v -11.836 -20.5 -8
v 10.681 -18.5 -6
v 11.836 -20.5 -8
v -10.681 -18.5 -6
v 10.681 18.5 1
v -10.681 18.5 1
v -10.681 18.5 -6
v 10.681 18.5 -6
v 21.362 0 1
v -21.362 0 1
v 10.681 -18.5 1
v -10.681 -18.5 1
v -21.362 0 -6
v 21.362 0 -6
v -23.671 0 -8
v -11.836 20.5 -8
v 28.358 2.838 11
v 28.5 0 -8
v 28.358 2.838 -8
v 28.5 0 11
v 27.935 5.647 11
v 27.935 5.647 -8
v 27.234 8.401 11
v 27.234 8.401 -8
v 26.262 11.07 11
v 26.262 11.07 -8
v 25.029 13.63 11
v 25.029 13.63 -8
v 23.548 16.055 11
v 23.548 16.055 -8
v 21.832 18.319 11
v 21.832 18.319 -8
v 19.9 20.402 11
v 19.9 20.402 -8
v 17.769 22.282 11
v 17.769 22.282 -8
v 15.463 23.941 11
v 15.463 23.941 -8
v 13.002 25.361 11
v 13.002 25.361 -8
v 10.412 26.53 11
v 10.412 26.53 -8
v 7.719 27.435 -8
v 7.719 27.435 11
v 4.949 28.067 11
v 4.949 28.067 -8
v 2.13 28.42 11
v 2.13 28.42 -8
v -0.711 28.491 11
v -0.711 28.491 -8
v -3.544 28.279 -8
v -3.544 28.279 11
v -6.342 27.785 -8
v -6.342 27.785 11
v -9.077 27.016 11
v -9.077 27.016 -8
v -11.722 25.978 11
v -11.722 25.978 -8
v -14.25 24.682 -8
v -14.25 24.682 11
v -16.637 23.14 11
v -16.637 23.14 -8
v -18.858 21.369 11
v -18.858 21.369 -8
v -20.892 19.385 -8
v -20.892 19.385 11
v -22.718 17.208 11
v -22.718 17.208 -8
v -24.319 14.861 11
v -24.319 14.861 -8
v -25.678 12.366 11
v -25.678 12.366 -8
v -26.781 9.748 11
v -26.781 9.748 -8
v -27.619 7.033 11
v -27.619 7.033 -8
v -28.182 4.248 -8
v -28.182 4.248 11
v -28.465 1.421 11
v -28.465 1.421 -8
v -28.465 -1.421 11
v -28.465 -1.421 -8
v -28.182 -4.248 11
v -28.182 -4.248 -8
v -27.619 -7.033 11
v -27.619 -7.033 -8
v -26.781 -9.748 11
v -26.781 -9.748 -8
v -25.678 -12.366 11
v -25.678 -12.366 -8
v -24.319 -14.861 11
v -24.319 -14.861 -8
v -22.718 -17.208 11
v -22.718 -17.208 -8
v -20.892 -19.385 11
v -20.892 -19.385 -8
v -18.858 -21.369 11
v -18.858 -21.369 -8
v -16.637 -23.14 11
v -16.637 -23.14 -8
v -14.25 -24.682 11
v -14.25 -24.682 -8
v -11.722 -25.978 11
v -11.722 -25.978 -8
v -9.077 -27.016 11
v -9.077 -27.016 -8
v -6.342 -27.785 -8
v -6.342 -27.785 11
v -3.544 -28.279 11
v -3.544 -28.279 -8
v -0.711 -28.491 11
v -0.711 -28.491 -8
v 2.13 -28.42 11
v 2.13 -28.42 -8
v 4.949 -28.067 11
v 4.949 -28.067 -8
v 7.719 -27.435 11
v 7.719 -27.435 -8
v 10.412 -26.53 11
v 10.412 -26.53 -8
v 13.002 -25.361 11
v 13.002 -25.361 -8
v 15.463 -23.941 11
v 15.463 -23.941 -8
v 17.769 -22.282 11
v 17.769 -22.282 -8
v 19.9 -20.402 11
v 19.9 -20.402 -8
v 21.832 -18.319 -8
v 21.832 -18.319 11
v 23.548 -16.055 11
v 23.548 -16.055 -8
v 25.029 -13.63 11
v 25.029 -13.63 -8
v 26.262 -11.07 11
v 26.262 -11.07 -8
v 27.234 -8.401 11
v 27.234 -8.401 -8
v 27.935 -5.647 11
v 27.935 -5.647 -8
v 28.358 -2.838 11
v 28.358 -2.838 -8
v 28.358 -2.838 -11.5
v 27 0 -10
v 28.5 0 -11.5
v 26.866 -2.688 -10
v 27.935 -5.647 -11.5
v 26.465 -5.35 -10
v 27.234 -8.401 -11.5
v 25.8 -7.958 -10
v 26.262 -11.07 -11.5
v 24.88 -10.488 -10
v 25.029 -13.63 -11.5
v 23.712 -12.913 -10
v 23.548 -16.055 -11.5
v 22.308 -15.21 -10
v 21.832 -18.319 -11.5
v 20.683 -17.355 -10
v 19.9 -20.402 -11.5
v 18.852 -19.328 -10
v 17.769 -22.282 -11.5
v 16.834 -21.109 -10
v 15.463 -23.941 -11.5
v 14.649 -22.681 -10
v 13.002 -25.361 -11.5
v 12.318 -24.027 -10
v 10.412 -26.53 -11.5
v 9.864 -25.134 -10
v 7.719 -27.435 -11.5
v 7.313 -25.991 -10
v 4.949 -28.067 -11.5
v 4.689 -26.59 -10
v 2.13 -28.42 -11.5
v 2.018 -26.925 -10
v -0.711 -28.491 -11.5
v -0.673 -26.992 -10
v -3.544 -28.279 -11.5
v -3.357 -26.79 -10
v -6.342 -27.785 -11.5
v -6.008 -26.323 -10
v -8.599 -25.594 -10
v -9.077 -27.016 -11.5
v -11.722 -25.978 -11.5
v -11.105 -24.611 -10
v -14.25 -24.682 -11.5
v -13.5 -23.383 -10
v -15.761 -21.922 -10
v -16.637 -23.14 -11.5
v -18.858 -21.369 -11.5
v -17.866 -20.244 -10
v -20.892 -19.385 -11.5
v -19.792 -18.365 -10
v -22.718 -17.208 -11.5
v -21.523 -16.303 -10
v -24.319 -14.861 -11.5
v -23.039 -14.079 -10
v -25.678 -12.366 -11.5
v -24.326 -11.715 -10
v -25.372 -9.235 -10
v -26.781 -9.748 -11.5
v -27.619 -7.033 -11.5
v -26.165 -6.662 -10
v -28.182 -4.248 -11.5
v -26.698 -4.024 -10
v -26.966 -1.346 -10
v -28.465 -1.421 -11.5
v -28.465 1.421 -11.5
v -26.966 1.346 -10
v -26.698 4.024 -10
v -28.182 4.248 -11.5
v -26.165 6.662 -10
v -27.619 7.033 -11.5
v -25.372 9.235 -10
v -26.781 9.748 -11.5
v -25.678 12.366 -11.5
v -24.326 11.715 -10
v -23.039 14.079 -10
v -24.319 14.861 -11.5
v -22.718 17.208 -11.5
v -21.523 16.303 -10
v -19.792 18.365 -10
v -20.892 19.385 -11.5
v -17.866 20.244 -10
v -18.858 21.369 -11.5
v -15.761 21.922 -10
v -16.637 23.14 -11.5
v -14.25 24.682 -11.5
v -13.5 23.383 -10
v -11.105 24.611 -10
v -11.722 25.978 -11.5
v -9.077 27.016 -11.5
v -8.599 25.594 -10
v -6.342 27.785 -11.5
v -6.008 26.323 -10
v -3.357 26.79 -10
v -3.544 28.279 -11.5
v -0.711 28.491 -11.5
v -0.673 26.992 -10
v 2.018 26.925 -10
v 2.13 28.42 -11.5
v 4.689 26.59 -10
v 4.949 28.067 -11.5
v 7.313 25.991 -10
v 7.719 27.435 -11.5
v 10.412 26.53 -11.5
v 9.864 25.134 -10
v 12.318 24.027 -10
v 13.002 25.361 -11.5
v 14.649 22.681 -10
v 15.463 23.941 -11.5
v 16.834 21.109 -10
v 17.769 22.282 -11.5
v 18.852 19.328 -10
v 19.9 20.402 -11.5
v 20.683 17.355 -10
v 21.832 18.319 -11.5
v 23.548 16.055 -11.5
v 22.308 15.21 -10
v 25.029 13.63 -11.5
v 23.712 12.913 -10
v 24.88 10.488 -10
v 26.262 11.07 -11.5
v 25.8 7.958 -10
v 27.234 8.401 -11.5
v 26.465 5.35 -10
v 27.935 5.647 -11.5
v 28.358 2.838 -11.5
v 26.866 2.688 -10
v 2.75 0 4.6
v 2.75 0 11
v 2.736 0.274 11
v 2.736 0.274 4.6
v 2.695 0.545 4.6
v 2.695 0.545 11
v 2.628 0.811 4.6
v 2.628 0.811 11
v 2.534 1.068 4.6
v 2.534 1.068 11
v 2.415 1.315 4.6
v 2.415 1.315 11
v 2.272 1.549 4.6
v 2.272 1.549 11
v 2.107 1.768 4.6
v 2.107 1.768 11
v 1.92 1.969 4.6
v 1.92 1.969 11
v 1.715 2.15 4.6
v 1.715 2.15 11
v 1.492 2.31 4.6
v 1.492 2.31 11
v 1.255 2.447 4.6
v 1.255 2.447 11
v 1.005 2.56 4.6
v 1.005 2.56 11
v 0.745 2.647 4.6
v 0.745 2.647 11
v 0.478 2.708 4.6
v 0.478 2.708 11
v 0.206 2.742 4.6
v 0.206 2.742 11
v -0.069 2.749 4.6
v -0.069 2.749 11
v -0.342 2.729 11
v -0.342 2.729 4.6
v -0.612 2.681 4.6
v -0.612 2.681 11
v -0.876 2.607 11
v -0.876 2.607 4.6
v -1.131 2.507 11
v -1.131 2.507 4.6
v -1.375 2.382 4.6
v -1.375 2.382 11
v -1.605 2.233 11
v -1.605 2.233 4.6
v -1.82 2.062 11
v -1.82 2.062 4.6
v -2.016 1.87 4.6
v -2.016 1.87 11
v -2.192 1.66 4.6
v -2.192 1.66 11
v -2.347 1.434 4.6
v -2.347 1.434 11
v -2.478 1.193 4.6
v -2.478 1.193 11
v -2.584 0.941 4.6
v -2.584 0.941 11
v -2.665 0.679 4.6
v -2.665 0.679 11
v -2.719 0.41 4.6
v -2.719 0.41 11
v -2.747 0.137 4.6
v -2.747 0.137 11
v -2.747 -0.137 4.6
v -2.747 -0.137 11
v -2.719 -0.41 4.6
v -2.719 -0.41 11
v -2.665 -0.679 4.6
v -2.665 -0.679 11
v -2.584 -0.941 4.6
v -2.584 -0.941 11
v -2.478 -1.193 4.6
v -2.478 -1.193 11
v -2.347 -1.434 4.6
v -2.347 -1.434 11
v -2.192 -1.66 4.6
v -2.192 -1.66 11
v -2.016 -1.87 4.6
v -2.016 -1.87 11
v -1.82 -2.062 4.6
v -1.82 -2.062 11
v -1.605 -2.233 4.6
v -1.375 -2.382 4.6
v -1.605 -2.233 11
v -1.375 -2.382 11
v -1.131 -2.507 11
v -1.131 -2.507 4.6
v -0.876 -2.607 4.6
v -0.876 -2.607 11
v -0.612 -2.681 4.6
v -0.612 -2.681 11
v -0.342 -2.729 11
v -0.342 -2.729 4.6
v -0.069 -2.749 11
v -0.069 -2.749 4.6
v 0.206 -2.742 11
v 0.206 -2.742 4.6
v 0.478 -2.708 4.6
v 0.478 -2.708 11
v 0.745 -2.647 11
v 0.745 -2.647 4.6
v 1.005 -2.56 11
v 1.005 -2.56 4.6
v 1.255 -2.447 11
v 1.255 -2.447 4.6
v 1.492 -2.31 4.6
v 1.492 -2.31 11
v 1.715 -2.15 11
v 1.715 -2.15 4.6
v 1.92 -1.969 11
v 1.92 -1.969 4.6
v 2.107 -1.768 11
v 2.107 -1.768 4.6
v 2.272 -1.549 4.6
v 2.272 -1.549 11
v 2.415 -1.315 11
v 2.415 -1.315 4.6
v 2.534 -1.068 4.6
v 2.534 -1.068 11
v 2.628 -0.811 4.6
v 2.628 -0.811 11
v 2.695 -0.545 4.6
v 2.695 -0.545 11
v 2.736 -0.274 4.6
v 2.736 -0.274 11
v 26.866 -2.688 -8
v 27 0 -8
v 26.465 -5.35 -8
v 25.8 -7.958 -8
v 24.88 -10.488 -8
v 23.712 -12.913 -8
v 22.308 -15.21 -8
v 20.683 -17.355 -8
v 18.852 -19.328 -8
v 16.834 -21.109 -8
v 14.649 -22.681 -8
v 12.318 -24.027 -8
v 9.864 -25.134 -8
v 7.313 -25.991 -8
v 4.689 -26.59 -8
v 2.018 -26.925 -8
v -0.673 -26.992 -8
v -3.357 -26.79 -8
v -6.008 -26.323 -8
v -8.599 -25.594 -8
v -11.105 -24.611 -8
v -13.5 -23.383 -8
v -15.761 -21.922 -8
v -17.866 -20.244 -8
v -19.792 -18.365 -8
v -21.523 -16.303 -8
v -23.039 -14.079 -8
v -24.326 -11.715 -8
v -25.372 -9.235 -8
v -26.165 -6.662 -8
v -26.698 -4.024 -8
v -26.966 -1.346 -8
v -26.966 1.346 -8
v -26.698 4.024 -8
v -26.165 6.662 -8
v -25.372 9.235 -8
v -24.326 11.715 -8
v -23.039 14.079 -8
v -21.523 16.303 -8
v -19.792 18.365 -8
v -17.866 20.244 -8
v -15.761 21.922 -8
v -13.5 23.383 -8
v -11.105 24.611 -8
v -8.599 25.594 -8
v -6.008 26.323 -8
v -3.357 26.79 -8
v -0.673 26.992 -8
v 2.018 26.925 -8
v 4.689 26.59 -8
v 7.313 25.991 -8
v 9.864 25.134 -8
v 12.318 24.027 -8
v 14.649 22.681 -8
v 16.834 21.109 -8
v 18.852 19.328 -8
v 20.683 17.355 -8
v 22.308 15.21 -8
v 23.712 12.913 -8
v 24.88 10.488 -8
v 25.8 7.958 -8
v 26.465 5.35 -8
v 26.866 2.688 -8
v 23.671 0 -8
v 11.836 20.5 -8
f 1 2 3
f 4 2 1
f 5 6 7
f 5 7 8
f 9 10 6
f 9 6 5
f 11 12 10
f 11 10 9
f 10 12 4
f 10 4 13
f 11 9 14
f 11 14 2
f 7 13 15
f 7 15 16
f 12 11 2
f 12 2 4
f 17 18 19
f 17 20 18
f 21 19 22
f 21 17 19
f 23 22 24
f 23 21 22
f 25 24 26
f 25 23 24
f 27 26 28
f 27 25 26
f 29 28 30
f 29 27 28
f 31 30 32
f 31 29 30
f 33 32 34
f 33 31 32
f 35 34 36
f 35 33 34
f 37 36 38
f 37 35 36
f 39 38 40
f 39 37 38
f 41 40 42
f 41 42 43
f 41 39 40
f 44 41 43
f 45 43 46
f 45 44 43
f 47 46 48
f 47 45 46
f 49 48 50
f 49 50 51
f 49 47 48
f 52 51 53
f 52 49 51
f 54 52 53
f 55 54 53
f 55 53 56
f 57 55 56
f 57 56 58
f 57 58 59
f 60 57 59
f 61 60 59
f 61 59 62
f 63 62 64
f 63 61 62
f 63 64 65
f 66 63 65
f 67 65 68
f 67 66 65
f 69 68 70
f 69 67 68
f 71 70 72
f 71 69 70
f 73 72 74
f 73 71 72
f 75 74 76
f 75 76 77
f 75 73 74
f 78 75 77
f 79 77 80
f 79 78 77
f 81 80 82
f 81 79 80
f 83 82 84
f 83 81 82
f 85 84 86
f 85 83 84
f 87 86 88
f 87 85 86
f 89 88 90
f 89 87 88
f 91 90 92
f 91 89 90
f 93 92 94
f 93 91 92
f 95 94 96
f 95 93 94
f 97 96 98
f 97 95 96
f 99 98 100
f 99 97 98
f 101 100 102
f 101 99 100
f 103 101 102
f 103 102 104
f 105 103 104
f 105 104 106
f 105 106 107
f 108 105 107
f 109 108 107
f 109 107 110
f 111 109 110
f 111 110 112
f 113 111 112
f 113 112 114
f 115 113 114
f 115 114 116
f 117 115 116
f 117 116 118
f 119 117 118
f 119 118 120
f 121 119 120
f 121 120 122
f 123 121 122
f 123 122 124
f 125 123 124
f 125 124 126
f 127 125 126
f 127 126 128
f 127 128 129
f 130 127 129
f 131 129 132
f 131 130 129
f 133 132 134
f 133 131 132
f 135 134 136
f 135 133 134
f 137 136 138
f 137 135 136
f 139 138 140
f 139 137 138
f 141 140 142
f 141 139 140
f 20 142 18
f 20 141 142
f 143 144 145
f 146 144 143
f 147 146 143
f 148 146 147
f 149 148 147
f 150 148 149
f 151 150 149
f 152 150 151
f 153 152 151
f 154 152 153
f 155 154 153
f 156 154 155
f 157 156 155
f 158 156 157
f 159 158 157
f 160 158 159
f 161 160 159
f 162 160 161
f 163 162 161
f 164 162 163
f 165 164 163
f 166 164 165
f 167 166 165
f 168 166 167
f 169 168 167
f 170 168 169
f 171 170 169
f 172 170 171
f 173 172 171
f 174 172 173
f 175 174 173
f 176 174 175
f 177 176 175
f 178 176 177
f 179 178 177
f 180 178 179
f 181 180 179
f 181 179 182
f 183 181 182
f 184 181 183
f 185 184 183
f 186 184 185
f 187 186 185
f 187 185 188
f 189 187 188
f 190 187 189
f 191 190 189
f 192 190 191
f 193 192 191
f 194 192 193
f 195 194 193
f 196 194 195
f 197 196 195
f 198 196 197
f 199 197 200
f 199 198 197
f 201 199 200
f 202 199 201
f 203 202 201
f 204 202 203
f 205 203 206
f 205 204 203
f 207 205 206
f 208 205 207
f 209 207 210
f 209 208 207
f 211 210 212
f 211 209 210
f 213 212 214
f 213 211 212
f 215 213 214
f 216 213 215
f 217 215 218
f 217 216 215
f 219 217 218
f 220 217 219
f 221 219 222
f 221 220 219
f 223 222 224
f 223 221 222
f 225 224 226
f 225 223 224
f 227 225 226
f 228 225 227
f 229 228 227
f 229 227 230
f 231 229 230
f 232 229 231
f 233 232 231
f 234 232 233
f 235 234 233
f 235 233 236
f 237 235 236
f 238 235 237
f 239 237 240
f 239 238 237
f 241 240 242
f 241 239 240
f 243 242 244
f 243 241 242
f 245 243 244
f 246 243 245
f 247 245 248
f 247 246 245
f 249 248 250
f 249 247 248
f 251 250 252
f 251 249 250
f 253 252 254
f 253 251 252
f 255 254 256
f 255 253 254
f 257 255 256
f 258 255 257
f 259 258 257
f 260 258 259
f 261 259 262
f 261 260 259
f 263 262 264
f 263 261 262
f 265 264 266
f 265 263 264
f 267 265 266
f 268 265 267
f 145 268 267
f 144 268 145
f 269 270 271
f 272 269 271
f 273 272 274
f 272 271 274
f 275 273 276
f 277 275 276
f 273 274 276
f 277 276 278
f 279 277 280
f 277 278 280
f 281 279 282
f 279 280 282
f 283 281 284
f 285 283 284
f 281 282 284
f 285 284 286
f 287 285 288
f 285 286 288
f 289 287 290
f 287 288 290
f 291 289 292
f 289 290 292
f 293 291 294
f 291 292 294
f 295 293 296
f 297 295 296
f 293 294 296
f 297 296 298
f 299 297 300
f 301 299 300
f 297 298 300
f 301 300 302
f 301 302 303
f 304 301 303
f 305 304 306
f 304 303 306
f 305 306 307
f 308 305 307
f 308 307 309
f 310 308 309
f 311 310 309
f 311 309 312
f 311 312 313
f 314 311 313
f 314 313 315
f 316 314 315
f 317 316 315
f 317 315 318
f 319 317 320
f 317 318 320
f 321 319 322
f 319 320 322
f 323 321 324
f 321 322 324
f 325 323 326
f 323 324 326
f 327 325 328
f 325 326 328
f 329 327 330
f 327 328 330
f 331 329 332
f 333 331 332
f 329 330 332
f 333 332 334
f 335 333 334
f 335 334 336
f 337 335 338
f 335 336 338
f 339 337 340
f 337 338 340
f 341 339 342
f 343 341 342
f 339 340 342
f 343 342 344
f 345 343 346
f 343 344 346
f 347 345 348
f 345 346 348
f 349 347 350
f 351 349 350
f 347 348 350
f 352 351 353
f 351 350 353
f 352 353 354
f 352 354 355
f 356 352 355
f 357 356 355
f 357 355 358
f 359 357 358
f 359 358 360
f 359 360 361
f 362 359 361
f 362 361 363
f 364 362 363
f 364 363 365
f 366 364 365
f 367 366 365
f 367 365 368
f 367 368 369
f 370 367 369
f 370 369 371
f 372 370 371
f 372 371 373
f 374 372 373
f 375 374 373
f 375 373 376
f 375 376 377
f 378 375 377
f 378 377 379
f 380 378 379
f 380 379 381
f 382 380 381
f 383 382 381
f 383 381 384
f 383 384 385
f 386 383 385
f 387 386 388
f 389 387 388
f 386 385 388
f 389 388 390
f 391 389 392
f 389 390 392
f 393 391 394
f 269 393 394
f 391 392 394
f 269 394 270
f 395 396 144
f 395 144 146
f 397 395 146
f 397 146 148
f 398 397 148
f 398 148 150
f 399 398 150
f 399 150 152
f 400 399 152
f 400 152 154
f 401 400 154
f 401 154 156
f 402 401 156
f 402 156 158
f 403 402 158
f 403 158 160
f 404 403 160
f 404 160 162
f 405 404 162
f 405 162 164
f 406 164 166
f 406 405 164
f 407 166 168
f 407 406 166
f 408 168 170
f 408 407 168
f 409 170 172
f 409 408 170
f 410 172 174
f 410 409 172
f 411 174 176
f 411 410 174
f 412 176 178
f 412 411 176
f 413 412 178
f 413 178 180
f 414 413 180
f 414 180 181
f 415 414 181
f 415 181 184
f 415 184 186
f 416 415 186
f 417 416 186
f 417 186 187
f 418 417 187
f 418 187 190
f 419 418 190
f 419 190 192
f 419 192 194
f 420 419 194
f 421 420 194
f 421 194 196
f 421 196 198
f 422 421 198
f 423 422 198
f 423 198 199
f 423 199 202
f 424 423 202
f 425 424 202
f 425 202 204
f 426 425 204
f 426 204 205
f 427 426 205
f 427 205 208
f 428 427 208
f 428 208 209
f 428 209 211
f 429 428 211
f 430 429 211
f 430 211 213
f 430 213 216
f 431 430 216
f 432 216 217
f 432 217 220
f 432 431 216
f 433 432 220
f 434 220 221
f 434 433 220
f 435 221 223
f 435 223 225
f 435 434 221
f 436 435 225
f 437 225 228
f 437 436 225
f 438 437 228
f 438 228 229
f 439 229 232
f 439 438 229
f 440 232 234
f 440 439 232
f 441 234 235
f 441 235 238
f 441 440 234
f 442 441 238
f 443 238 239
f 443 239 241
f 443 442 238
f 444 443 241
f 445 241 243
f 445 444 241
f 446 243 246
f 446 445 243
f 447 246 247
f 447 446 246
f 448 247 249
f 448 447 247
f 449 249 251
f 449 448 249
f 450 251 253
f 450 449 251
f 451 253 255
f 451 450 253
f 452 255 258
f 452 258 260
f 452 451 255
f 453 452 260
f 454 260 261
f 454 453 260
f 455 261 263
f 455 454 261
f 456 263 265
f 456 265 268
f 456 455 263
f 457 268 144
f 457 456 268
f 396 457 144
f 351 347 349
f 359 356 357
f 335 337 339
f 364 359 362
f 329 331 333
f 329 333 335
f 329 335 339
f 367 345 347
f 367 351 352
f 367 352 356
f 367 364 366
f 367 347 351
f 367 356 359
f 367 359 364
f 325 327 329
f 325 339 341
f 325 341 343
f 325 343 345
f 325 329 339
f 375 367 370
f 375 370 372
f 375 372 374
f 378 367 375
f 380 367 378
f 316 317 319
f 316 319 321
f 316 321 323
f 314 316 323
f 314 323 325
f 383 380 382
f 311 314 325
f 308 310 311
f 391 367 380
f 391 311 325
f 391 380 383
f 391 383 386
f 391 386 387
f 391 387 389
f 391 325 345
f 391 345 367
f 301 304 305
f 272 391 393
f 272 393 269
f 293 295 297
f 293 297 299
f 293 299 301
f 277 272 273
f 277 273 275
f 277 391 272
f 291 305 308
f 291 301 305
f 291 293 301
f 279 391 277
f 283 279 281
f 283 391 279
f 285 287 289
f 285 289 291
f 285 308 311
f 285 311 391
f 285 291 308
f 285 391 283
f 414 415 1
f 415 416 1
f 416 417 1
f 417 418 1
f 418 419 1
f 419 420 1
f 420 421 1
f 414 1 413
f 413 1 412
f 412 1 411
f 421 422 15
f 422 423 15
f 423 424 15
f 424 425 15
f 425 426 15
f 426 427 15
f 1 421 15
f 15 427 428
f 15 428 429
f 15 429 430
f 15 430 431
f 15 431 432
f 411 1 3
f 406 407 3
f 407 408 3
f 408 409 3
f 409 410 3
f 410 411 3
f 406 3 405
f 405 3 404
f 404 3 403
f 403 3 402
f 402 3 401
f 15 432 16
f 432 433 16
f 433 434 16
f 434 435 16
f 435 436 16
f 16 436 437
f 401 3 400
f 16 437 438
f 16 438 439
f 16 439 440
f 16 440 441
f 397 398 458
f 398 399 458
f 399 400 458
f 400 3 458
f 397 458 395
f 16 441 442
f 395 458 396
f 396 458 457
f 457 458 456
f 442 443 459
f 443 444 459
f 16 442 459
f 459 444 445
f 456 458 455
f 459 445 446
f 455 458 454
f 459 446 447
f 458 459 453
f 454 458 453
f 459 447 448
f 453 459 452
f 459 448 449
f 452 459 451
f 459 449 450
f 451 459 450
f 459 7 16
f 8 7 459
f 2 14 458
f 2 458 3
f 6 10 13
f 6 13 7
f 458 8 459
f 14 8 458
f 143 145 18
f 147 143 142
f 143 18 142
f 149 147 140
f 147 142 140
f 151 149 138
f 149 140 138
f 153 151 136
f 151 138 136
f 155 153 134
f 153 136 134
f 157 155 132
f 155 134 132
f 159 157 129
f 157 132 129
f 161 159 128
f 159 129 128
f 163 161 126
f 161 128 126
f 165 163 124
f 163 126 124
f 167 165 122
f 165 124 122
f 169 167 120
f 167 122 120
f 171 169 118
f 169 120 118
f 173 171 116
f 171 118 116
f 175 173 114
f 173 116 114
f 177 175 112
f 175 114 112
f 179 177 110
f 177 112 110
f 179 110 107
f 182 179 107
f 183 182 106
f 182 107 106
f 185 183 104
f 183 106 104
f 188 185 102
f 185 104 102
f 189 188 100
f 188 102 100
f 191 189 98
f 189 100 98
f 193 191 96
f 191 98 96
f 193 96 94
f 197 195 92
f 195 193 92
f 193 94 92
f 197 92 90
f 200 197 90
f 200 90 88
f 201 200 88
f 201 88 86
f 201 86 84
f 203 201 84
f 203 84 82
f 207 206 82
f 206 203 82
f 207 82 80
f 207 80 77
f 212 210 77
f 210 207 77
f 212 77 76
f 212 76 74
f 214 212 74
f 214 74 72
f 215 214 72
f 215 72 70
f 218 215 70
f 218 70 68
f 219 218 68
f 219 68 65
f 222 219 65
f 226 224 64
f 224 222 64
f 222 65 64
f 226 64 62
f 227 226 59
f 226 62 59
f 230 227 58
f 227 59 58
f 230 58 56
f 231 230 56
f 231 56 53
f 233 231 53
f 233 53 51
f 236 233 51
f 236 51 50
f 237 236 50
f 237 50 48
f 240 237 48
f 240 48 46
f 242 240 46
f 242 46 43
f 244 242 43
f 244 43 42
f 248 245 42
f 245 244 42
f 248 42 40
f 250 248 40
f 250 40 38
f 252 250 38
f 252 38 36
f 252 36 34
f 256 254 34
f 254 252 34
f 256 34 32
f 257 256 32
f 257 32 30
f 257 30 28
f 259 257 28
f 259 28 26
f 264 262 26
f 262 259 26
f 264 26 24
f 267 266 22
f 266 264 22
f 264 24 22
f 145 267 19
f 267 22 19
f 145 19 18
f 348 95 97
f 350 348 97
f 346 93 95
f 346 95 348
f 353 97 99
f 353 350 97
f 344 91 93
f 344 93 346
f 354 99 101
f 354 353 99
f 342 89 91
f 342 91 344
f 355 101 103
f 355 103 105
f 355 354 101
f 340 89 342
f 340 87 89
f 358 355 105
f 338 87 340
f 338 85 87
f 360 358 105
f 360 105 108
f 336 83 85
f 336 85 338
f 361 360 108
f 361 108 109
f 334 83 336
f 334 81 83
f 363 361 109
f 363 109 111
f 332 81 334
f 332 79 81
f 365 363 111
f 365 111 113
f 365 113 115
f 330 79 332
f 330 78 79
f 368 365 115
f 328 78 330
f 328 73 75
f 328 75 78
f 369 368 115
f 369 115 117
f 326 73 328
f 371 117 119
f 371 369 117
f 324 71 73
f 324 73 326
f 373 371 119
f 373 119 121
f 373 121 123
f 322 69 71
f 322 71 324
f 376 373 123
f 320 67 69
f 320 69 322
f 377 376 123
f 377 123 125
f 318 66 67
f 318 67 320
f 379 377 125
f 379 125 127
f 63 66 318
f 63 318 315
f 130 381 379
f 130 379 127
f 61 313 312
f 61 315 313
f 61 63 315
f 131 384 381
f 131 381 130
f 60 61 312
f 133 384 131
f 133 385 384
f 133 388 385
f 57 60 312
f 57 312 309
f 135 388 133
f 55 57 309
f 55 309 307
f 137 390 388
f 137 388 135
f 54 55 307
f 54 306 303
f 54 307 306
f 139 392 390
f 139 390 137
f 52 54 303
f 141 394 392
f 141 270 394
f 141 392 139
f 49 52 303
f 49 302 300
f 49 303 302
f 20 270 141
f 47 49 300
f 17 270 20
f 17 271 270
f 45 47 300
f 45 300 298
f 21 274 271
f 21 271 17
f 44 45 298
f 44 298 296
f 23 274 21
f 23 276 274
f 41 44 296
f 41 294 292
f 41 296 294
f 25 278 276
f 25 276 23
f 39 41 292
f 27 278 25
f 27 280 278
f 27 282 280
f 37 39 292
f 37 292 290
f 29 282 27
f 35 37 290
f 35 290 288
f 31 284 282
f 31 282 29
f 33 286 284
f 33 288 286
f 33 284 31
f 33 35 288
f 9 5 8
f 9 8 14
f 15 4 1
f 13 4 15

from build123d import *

# Parameters (mm, degrees)
F0_R     = 28.5
F1_DEPTH = 11
F3_DEPTH = 1
F4_R     = 2.75
F5_DEPTH = 6.4
F6_DEPTH = 8
F7_R     = 28.5
F7_R_2   = 27
F8_DEPTH = 4
F10_SIZE = 2


# Not quite as in the source:
# - a fillet or chamfer that OpenCascade refuses, or shapes differently, is made with other operations: its cross-section is extruded or revolved along the edge and cut away or added


with BuildPart() as f1:
    # F0 (on Top) → F1 (new body)
    with BuildSketch(Plane.XY):
        Circle(F0_R)
    extrude(amount=F1_DEPTH)

    # F2 (on face) → F3 (cut)
    with BuildSketch(Plane(origin=(0, 0, 0), x_dir=(1, 0, 0), z_dir=(0, 0, -1))):
        Polygon((10.68097998, 18.5), (-10.68097998, 18.5), (-21.36195996, 0), (-10.68097998, -18.5), (10.68097998, -18.5), (21.36195996, 0), align=None)
    extrude(amount=-F3_DEPTH, mode=Mode.SUBTRACT)

    # F4 (on face) → F5 (cut)
    with BuildSketch(Plane.XY.offset(11)):
        Circle(F4_R)
    extrude(amount=-F5_DEPTH, mode=Mode.SUBTRACT)

    # F6 (add): a face of the model
    f6_faces = [f1.faces().sort_by_distance(p)[0] for p in [
        (-27.6938982694, 0, 0),
    ]]
    extrude(f6_faces, amount=F6_DEPTH)

    # F7 (on face) → F8 (join)
    with BuildSketch(Plane(origin=(0, 0, -8), x_dir=(1, 0, 0), z_dir=(0, 0, -1))):
        Circle(F7_R)
        Circle(F7_R_2, mode=Mode.SUBTRACT)
    extrude(amount=F8_DEPTH)

    # F9: chamfer of 2 on 1 edges, made by hand

    # F9_s1 → F9_t2 (revolve, cut)
    with BuildSketch(Plane.XZ):
        Polygon((29, -12), (27, -10), (27, -12), align=None)
    revolve(axis=Axis((0, 0, -12), (0, 0, -1)), mode=Mode.SUBTRACT)

    # F10
    f10_edges = [f1.edges().sort_by_distance(p)[0] for p in [
        (0, -18.5, -8),
        (16.02147, -9.25, -8),
        (16.02147, 9.25, -8),
        (0, 18.5, -8),
        (-16.02147, 9.25, -8),
        (-16.02147, -9.25, -8),
    ]]
    chamfer(f10_edges, length=F10_SIZE)


solid = f1.part
